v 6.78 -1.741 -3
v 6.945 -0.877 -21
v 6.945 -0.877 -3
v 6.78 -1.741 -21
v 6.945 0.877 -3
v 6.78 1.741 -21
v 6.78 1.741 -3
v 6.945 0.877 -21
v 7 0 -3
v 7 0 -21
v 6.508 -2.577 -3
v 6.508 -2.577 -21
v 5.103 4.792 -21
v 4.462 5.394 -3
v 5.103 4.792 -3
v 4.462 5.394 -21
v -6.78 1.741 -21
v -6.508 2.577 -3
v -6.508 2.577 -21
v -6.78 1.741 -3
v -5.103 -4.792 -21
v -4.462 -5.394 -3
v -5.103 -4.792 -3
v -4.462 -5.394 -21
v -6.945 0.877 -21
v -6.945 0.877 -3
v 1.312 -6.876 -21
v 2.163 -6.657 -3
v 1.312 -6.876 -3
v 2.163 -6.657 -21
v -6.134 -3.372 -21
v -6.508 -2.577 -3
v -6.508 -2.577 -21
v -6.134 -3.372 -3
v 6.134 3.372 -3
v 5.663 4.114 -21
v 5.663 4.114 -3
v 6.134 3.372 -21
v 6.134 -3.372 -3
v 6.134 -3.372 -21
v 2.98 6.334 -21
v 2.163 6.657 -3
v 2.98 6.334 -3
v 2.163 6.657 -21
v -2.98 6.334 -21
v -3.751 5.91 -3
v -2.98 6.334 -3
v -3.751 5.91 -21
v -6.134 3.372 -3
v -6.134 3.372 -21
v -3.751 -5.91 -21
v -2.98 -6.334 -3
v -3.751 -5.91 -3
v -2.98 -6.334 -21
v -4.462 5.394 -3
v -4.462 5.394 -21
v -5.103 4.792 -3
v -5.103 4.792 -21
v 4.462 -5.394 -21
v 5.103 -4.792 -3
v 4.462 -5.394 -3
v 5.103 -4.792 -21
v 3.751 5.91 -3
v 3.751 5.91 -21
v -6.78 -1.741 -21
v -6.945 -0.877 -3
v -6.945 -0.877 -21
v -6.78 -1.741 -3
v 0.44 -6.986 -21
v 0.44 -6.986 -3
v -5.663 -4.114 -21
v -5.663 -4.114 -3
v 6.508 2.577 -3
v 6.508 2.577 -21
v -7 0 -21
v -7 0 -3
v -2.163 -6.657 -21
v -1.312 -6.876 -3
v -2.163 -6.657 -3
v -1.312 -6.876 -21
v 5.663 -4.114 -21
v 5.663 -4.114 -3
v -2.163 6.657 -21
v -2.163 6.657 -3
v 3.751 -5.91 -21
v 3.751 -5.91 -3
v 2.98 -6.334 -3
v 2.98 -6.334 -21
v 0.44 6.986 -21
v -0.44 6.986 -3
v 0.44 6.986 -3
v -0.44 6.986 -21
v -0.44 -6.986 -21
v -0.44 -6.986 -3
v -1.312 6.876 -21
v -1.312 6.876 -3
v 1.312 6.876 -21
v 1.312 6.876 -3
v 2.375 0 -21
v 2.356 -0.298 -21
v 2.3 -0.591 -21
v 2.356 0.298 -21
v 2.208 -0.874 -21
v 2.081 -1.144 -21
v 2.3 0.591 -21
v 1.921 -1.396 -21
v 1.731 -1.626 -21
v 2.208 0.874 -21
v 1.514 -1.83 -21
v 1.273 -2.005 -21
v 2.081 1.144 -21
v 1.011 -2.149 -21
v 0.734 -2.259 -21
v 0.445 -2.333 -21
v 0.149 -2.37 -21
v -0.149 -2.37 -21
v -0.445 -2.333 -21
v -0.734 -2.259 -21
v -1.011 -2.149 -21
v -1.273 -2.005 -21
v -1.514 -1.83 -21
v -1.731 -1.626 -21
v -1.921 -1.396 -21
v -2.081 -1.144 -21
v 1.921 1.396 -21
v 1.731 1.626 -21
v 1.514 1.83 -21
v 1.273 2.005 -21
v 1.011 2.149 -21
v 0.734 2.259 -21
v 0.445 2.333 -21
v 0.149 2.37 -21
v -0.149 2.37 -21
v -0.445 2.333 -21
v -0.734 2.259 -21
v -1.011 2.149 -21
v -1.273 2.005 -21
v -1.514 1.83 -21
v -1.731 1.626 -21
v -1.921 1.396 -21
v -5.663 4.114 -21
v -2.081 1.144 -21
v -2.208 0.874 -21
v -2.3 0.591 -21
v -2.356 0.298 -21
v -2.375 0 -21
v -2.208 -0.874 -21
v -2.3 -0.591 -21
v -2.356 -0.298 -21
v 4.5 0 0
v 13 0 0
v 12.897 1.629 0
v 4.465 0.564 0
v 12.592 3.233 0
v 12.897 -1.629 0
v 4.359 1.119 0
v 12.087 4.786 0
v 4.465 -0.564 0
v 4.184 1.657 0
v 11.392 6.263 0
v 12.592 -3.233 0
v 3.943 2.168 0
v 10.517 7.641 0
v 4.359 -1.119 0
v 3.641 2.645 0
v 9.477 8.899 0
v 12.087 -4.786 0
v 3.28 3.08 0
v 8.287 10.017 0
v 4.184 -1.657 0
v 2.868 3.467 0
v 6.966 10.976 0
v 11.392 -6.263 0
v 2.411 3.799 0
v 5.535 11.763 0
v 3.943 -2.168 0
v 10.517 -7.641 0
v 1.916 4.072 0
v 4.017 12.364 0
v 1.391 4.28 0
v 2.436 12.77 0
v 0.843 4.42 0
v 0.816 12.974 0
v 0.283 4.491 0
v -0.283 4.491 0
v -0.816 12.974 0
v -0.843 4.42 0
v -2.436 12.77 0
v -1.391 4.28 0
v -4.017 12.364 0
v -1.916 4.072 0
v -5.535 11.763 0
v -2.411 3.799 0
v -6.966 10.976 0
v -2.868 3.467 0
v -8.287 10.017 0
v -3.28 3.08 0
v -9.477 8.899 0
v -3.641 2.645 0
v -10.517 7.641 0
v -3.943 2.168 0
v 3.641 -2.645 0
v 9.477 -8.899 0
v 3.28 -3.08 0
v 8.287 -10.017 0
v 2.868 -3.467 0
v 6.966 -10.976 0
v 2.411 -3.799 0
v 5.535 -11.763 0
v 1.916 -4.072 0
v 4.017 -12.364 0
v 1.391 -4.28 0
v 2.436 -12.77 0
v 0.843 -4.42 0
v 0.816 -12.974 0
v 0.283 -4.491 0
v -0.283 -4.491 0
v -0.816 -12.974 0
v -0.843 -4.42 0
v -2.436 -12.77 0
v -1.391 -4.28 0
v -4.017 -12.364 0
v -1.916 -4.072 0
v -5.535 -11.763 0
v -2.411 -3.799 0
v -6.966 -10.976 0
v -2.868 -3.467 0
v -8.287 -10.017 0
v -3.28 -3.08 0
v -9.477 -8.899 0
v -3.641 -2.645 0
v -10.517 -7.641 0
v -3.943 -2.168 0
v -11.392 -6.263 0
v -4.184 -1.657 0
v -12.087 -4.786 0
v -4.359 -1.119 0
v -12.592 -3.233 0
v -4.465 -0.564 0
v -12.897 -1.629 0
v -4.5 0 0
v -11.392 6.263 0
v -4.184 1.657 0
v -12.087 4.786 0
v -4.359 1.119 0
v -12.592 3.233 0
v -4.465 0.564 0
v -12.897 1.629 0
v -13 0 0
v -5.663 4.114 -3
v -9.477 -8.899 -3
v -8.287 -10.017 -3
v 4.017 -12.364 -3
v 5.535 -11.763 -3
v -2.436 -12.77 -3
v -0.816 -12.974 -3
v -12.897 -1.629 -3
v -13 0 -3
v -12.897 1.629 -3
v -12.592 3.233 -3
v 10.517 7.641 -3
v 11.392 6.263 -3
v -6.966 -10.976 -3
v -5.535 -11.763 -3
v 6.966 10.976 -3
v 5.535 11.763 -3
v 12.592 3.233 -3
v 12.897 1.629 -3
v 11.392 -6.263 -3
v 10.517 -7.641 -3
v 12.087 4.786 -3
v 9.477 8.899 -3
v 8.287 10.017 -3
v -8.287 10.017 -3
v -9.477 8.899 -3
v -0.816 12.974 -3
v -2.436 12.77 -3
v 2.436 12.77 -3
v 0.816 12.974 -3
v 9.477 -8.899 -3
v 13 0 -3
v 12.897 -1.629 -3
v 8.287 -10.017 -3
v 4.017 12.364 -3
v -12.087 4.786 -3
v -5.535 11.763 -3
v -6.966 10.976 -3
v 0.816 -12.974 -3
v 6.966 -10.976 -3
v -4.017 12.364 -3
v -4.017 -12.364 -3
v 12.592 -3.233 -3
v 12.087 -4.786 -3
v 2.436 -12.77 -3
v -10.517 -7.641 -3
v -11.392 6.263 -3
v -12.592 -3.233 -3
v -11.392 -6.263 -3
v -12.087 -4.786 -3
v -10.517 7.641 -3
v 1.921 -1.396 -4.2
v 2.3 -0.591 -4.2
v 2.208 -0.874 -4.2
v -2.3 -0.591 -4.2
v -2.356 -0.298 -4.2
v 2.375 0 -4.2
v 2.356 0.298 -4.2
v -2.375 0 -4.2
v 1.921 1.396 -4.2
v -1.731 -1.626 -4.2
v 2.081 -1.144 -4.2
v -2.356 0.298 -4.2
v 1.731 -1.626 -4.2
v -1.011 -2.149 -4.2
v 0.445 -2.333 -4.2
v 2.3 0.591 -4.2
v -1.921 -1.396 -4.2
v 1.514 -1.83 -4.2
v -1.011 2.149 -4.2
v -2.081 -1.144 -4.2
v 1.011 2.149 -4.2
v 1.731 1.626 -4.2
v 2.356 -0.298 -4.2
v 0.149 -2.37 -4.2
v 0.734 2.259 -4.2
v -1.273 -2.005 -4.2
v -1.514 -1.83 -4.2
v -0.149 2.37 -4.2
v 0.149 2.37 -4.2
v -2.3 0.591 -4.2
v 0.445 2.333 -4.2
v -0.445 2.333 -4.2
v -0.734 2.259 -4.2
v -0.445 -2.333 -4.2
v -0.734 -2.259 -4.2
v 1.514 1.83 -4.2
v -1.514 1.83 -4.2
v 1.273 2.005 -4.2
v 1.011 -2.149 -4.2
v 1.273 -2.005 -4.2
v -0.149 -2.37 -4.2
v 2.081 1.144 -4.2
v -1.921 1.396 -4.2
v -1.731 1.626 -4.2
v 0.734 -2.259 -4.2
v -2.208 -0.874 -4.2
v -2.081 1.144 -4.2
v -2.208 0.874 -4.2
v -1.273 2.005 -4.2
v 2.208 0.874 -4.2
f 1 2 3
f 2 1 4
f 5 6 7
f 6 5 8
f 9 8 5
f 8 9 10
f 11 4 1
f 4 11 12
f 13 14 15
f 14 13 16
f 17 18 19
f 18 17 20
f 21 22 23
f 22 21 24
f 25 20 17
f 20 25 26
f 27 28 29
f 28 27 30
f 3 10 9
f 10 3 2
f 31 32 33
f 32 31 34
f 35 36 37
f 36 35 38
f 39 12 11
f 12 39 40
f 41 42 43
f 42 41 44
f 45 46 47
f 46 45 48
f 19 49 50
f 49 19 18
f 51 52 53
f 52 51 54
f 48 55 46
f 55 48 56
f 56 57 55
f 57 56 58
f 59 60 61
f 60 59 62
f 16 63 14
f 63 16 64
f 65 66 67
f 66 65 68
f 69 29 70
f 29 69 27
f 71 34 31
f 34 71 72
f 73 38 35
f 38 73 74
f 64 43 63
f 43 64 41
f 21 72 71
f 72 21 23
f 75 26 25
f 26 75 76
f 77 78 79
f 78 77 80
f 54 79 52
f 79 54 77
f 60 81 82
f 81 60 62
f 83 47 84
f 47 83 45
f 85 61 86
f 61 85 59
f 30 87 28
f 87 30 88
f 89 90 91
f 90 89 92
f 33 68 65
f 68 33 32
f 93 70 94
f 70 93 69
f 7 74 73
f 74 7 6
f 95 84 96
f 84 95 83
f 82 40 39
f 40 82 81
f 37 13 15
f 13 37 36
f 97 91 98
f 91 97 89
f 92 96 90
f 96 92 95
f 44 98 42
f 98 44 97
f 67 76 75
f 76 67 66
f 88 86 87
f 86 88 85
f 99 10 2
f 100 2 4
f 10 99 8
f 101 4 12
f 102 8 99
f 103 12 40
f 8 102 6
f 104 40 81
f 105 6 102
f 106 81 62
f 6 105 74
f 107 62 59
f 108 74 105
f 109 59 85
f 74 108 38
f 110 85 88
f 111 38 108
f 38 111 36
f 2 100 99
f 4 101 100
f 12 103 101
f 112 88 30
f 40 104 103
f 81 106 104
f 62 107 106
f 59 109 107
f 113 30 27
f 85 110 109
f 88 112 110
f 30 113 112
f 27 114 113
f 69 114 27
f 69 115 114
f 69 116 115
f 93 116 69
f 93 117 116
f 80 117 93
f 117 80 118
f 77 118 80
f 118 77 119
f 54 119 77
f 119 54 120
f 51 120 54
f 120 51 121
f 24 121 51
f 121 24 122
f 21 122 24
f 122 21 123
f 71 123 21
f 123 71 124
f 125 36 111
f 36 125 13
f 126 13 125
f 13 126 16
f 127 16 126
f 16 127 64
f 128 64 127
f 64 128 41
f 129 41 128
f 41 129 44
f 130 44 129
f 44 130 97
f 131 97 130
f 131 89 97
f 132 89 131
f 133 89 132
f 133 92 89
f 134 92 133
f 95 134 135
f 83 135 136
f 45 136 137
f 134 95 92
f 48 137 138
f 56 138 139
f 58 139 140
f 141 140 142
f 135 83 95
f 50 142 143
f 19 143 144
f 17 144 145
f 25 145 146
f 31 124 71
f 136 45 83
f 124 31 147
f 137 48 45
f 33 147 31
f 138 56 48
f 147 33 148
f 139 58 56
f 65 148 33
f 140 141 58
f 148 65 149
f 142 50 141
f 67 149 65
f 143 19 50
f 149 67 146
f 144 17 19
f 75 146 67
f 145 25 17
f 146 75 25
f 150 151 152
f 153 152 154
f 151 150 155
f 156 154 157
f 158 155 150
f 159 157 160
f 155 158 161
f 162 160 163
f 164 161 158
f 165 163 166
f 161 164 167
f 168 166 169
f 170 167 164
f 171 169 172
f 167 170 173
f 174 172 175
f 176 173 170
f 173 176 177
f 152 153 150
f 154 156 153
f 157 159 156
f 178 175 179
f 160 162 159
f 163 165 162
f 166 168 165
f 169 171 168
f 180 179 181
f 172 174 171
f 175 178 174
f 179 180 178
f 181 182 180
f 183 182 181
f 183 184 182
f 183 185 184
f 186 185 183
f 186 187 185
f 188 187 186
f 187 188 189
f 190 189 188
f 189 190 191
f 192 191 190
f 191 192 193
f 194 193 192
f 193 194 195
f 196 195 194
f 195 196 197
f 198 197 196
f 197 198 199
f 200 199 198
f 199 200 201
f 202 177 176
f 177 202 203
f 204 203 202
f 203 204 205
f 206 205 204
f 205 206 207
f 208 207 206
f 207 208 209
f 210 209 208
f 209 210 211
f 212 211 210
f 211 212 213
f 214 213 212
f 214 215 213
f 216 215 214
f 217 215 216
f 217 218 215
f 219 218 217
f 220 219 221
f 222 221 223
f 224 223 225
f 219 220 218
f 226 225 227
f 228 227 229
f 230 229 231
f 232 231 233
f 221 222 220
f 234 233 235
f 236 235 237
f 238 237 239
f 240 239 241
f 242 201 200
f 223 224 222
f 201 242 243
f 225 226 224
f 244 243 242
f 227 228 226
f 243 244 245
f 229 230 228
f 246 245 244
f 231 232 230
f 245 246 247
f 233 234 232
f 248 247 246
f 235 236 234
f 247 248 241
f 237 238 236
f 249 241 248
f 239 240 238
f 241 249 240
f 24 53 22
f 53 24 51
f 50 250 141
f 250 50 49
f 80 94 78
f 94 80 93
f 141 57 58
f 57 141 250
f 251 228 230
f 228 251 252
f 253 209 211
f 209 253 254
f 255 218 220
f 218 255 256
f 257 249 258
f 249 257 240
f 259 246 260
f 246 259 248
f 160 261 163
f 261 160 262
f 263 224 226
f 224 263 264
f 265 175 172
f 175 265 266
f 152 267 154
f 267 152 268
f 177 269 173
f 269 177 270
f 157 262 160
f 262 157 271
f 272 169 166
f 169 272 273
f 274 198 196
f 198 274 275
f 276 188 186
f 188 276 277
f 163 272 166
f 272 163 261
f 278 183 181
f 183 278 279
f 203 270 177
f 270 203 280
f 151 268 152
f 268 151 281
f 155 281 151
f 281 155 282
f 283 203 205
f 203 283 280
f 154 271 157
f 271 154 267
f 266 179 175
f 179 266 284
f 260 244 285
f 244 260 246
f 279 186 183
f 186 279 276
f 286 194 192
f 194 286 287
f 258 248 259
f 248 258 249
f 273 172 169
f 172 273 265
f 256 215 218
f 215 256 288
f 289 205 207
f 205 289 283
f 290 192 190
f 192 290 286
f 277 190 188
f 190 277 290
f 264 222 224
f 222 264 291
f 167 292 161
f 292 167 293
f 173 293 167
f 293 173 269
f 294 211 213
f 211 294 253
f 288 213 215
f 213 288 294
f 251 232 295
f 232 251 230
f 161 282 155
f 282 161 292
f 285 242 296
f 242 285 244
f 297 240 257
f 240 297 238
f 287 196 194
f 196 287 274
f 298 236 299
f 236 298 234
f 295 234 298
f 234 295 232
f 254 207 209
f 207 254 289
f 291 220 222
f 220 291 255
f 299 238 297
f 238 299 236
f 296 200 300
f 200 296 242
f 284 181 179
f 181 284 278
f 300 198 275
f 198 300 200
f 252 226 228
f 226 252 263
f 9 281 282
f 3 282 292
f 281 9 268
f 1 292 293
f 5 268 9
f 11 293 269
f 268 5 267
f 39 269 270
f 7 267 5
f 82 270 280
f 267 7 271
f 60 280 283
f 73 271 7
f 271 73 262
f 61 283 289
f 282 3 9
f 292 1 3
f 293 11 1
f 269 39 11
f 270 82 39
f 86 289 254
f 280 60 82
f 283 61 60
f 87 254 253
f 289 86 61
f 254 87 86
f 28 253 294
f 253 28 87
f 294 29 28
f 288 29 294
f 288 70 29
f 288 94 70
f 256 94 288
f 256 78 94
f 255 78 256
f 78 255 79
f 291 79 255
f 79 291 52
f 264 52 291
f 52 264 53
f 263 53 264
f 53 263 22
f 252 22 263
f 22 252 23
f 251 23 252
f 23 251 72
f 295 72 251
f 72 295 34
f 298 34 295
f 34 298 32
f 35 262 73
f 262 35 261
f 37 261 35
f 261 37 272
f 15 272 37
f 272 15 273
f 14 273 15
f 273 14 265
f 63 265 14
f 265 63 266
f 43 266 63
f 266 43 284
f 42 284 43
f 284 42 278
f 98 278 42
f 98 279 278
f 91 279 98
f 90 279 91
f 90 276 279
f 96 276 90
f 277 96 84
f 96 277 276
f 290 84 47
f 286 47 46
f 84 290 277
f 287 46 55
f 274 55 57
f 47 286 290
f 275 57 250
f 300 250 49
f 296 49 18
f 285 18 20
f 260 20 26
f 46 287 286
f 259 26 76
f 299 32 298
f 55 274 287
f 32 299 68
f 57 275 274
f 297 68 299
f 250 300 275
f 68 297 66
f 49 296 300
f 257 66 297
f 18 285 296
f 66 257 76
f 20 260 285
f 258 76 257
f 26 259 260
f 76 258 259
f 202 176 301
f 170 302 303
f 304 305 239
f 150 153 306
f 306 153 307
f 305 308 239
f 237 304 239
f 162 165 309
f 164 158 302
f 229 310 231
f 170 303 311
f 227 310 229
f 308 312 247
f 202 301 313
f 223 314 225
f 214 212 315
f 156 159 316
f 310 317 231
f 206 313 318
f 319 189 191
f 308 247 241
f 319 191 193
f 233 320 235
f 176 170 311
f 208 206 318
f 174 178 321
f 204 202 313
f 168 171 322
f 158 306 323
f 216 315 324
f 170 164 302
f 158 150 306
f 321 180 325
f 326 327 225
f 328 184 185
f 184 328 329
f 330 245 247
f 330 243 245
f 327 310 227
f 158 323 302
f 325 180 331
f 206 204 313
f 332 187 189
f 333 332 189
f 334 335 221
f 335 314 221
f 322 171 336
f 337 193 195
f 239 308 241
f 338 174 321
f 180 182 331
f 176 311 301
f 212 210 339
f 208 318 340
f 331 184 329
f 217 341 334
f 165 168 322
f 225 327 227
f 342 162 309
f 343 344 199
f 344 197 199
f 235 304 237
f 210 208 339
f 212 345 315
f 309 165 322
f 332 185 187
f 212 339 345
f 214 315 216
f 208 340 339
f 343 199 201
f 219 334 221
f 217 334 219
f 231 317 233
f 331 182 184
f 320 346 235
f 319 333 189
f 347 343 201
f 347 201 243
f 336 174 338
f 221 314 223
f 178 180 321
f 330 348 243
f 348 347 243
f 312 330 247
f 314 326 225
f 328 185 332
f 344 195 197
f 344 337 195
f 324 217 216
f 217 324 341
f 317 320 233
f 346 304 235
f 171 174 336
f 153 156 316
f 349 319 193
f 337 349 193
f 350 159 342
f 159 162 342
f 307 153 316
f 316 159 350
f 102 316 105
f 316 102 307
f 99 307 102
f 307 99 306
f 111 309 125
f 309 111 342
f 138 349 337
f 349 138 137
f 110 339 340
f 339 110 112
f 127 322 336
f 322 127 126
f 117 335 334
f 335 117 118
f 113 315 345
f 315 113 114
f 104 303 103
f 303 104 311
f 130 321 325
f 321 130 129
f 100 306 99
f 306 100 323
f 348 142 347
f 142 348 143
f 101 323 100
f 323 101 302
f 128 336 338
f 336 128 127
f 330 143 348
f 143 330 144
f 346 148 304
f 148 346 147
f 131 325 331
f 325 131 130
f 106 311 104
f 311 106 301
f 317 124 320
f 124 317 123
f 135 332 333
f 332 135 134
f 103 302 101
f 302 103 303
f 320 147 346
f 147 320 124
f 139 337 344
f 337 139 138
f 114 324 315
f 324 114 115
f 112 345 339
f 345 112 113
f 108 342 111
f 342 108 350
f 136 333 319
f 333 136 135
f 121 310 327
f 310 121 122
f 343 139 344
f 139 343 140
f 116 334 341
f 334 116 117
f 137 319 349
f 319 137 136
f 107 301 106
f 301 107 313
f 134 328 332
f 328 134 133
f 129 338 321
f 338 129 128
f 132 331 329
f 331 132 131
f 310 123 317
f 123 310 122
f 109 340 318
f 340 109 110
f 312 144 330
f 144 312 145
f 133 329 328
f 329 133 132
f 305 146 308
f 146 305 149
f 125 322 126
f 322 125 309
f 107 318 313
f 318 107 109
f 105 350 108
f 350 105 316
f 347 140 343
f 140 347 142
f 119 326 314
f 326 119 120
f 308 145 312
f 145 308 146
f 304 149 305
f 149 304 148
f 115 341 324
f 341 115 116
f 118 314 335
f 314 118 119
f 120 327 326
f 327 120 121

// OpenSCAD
$fn = 50;


difference() {
	union() {
		translate(v = [0, 0, -21.0000000000]) {
			cylinder(h = 21, r = 7.0000000000);
		}
		translate(v = [0, 0, -3.0000000000]) {
			cylinder(h = 3, r = 13.0000000000);
		}
	}
	union() {
		translate(v = [0, 0, 0]) {
			rotate(a = [0, 0, 0]) {
				difference() {
					union() {
						#translate(v = [0, 0, -21.0000000000]) {
							cylinder(h = 21, r = 2.2500000000);
						}
						#translate(v = [0, 0, -4.2000000000]) {
							cylinder(h = 4.2000000000, r = 7.0000000000, r1 = 2.3750000000, r2 = 4.5000000000);
						}
						#translate(v = [0, 0, -21.0000000000]) {
							cylinder(h = 21, r = 2.3750000000);
						}
						#translate(v = [0, 0, -21.0000000000]) {
							cylinder(h = 21, r = 2.2500000000);
						}
					}
					union();
				}
			}
		}
	}
}
